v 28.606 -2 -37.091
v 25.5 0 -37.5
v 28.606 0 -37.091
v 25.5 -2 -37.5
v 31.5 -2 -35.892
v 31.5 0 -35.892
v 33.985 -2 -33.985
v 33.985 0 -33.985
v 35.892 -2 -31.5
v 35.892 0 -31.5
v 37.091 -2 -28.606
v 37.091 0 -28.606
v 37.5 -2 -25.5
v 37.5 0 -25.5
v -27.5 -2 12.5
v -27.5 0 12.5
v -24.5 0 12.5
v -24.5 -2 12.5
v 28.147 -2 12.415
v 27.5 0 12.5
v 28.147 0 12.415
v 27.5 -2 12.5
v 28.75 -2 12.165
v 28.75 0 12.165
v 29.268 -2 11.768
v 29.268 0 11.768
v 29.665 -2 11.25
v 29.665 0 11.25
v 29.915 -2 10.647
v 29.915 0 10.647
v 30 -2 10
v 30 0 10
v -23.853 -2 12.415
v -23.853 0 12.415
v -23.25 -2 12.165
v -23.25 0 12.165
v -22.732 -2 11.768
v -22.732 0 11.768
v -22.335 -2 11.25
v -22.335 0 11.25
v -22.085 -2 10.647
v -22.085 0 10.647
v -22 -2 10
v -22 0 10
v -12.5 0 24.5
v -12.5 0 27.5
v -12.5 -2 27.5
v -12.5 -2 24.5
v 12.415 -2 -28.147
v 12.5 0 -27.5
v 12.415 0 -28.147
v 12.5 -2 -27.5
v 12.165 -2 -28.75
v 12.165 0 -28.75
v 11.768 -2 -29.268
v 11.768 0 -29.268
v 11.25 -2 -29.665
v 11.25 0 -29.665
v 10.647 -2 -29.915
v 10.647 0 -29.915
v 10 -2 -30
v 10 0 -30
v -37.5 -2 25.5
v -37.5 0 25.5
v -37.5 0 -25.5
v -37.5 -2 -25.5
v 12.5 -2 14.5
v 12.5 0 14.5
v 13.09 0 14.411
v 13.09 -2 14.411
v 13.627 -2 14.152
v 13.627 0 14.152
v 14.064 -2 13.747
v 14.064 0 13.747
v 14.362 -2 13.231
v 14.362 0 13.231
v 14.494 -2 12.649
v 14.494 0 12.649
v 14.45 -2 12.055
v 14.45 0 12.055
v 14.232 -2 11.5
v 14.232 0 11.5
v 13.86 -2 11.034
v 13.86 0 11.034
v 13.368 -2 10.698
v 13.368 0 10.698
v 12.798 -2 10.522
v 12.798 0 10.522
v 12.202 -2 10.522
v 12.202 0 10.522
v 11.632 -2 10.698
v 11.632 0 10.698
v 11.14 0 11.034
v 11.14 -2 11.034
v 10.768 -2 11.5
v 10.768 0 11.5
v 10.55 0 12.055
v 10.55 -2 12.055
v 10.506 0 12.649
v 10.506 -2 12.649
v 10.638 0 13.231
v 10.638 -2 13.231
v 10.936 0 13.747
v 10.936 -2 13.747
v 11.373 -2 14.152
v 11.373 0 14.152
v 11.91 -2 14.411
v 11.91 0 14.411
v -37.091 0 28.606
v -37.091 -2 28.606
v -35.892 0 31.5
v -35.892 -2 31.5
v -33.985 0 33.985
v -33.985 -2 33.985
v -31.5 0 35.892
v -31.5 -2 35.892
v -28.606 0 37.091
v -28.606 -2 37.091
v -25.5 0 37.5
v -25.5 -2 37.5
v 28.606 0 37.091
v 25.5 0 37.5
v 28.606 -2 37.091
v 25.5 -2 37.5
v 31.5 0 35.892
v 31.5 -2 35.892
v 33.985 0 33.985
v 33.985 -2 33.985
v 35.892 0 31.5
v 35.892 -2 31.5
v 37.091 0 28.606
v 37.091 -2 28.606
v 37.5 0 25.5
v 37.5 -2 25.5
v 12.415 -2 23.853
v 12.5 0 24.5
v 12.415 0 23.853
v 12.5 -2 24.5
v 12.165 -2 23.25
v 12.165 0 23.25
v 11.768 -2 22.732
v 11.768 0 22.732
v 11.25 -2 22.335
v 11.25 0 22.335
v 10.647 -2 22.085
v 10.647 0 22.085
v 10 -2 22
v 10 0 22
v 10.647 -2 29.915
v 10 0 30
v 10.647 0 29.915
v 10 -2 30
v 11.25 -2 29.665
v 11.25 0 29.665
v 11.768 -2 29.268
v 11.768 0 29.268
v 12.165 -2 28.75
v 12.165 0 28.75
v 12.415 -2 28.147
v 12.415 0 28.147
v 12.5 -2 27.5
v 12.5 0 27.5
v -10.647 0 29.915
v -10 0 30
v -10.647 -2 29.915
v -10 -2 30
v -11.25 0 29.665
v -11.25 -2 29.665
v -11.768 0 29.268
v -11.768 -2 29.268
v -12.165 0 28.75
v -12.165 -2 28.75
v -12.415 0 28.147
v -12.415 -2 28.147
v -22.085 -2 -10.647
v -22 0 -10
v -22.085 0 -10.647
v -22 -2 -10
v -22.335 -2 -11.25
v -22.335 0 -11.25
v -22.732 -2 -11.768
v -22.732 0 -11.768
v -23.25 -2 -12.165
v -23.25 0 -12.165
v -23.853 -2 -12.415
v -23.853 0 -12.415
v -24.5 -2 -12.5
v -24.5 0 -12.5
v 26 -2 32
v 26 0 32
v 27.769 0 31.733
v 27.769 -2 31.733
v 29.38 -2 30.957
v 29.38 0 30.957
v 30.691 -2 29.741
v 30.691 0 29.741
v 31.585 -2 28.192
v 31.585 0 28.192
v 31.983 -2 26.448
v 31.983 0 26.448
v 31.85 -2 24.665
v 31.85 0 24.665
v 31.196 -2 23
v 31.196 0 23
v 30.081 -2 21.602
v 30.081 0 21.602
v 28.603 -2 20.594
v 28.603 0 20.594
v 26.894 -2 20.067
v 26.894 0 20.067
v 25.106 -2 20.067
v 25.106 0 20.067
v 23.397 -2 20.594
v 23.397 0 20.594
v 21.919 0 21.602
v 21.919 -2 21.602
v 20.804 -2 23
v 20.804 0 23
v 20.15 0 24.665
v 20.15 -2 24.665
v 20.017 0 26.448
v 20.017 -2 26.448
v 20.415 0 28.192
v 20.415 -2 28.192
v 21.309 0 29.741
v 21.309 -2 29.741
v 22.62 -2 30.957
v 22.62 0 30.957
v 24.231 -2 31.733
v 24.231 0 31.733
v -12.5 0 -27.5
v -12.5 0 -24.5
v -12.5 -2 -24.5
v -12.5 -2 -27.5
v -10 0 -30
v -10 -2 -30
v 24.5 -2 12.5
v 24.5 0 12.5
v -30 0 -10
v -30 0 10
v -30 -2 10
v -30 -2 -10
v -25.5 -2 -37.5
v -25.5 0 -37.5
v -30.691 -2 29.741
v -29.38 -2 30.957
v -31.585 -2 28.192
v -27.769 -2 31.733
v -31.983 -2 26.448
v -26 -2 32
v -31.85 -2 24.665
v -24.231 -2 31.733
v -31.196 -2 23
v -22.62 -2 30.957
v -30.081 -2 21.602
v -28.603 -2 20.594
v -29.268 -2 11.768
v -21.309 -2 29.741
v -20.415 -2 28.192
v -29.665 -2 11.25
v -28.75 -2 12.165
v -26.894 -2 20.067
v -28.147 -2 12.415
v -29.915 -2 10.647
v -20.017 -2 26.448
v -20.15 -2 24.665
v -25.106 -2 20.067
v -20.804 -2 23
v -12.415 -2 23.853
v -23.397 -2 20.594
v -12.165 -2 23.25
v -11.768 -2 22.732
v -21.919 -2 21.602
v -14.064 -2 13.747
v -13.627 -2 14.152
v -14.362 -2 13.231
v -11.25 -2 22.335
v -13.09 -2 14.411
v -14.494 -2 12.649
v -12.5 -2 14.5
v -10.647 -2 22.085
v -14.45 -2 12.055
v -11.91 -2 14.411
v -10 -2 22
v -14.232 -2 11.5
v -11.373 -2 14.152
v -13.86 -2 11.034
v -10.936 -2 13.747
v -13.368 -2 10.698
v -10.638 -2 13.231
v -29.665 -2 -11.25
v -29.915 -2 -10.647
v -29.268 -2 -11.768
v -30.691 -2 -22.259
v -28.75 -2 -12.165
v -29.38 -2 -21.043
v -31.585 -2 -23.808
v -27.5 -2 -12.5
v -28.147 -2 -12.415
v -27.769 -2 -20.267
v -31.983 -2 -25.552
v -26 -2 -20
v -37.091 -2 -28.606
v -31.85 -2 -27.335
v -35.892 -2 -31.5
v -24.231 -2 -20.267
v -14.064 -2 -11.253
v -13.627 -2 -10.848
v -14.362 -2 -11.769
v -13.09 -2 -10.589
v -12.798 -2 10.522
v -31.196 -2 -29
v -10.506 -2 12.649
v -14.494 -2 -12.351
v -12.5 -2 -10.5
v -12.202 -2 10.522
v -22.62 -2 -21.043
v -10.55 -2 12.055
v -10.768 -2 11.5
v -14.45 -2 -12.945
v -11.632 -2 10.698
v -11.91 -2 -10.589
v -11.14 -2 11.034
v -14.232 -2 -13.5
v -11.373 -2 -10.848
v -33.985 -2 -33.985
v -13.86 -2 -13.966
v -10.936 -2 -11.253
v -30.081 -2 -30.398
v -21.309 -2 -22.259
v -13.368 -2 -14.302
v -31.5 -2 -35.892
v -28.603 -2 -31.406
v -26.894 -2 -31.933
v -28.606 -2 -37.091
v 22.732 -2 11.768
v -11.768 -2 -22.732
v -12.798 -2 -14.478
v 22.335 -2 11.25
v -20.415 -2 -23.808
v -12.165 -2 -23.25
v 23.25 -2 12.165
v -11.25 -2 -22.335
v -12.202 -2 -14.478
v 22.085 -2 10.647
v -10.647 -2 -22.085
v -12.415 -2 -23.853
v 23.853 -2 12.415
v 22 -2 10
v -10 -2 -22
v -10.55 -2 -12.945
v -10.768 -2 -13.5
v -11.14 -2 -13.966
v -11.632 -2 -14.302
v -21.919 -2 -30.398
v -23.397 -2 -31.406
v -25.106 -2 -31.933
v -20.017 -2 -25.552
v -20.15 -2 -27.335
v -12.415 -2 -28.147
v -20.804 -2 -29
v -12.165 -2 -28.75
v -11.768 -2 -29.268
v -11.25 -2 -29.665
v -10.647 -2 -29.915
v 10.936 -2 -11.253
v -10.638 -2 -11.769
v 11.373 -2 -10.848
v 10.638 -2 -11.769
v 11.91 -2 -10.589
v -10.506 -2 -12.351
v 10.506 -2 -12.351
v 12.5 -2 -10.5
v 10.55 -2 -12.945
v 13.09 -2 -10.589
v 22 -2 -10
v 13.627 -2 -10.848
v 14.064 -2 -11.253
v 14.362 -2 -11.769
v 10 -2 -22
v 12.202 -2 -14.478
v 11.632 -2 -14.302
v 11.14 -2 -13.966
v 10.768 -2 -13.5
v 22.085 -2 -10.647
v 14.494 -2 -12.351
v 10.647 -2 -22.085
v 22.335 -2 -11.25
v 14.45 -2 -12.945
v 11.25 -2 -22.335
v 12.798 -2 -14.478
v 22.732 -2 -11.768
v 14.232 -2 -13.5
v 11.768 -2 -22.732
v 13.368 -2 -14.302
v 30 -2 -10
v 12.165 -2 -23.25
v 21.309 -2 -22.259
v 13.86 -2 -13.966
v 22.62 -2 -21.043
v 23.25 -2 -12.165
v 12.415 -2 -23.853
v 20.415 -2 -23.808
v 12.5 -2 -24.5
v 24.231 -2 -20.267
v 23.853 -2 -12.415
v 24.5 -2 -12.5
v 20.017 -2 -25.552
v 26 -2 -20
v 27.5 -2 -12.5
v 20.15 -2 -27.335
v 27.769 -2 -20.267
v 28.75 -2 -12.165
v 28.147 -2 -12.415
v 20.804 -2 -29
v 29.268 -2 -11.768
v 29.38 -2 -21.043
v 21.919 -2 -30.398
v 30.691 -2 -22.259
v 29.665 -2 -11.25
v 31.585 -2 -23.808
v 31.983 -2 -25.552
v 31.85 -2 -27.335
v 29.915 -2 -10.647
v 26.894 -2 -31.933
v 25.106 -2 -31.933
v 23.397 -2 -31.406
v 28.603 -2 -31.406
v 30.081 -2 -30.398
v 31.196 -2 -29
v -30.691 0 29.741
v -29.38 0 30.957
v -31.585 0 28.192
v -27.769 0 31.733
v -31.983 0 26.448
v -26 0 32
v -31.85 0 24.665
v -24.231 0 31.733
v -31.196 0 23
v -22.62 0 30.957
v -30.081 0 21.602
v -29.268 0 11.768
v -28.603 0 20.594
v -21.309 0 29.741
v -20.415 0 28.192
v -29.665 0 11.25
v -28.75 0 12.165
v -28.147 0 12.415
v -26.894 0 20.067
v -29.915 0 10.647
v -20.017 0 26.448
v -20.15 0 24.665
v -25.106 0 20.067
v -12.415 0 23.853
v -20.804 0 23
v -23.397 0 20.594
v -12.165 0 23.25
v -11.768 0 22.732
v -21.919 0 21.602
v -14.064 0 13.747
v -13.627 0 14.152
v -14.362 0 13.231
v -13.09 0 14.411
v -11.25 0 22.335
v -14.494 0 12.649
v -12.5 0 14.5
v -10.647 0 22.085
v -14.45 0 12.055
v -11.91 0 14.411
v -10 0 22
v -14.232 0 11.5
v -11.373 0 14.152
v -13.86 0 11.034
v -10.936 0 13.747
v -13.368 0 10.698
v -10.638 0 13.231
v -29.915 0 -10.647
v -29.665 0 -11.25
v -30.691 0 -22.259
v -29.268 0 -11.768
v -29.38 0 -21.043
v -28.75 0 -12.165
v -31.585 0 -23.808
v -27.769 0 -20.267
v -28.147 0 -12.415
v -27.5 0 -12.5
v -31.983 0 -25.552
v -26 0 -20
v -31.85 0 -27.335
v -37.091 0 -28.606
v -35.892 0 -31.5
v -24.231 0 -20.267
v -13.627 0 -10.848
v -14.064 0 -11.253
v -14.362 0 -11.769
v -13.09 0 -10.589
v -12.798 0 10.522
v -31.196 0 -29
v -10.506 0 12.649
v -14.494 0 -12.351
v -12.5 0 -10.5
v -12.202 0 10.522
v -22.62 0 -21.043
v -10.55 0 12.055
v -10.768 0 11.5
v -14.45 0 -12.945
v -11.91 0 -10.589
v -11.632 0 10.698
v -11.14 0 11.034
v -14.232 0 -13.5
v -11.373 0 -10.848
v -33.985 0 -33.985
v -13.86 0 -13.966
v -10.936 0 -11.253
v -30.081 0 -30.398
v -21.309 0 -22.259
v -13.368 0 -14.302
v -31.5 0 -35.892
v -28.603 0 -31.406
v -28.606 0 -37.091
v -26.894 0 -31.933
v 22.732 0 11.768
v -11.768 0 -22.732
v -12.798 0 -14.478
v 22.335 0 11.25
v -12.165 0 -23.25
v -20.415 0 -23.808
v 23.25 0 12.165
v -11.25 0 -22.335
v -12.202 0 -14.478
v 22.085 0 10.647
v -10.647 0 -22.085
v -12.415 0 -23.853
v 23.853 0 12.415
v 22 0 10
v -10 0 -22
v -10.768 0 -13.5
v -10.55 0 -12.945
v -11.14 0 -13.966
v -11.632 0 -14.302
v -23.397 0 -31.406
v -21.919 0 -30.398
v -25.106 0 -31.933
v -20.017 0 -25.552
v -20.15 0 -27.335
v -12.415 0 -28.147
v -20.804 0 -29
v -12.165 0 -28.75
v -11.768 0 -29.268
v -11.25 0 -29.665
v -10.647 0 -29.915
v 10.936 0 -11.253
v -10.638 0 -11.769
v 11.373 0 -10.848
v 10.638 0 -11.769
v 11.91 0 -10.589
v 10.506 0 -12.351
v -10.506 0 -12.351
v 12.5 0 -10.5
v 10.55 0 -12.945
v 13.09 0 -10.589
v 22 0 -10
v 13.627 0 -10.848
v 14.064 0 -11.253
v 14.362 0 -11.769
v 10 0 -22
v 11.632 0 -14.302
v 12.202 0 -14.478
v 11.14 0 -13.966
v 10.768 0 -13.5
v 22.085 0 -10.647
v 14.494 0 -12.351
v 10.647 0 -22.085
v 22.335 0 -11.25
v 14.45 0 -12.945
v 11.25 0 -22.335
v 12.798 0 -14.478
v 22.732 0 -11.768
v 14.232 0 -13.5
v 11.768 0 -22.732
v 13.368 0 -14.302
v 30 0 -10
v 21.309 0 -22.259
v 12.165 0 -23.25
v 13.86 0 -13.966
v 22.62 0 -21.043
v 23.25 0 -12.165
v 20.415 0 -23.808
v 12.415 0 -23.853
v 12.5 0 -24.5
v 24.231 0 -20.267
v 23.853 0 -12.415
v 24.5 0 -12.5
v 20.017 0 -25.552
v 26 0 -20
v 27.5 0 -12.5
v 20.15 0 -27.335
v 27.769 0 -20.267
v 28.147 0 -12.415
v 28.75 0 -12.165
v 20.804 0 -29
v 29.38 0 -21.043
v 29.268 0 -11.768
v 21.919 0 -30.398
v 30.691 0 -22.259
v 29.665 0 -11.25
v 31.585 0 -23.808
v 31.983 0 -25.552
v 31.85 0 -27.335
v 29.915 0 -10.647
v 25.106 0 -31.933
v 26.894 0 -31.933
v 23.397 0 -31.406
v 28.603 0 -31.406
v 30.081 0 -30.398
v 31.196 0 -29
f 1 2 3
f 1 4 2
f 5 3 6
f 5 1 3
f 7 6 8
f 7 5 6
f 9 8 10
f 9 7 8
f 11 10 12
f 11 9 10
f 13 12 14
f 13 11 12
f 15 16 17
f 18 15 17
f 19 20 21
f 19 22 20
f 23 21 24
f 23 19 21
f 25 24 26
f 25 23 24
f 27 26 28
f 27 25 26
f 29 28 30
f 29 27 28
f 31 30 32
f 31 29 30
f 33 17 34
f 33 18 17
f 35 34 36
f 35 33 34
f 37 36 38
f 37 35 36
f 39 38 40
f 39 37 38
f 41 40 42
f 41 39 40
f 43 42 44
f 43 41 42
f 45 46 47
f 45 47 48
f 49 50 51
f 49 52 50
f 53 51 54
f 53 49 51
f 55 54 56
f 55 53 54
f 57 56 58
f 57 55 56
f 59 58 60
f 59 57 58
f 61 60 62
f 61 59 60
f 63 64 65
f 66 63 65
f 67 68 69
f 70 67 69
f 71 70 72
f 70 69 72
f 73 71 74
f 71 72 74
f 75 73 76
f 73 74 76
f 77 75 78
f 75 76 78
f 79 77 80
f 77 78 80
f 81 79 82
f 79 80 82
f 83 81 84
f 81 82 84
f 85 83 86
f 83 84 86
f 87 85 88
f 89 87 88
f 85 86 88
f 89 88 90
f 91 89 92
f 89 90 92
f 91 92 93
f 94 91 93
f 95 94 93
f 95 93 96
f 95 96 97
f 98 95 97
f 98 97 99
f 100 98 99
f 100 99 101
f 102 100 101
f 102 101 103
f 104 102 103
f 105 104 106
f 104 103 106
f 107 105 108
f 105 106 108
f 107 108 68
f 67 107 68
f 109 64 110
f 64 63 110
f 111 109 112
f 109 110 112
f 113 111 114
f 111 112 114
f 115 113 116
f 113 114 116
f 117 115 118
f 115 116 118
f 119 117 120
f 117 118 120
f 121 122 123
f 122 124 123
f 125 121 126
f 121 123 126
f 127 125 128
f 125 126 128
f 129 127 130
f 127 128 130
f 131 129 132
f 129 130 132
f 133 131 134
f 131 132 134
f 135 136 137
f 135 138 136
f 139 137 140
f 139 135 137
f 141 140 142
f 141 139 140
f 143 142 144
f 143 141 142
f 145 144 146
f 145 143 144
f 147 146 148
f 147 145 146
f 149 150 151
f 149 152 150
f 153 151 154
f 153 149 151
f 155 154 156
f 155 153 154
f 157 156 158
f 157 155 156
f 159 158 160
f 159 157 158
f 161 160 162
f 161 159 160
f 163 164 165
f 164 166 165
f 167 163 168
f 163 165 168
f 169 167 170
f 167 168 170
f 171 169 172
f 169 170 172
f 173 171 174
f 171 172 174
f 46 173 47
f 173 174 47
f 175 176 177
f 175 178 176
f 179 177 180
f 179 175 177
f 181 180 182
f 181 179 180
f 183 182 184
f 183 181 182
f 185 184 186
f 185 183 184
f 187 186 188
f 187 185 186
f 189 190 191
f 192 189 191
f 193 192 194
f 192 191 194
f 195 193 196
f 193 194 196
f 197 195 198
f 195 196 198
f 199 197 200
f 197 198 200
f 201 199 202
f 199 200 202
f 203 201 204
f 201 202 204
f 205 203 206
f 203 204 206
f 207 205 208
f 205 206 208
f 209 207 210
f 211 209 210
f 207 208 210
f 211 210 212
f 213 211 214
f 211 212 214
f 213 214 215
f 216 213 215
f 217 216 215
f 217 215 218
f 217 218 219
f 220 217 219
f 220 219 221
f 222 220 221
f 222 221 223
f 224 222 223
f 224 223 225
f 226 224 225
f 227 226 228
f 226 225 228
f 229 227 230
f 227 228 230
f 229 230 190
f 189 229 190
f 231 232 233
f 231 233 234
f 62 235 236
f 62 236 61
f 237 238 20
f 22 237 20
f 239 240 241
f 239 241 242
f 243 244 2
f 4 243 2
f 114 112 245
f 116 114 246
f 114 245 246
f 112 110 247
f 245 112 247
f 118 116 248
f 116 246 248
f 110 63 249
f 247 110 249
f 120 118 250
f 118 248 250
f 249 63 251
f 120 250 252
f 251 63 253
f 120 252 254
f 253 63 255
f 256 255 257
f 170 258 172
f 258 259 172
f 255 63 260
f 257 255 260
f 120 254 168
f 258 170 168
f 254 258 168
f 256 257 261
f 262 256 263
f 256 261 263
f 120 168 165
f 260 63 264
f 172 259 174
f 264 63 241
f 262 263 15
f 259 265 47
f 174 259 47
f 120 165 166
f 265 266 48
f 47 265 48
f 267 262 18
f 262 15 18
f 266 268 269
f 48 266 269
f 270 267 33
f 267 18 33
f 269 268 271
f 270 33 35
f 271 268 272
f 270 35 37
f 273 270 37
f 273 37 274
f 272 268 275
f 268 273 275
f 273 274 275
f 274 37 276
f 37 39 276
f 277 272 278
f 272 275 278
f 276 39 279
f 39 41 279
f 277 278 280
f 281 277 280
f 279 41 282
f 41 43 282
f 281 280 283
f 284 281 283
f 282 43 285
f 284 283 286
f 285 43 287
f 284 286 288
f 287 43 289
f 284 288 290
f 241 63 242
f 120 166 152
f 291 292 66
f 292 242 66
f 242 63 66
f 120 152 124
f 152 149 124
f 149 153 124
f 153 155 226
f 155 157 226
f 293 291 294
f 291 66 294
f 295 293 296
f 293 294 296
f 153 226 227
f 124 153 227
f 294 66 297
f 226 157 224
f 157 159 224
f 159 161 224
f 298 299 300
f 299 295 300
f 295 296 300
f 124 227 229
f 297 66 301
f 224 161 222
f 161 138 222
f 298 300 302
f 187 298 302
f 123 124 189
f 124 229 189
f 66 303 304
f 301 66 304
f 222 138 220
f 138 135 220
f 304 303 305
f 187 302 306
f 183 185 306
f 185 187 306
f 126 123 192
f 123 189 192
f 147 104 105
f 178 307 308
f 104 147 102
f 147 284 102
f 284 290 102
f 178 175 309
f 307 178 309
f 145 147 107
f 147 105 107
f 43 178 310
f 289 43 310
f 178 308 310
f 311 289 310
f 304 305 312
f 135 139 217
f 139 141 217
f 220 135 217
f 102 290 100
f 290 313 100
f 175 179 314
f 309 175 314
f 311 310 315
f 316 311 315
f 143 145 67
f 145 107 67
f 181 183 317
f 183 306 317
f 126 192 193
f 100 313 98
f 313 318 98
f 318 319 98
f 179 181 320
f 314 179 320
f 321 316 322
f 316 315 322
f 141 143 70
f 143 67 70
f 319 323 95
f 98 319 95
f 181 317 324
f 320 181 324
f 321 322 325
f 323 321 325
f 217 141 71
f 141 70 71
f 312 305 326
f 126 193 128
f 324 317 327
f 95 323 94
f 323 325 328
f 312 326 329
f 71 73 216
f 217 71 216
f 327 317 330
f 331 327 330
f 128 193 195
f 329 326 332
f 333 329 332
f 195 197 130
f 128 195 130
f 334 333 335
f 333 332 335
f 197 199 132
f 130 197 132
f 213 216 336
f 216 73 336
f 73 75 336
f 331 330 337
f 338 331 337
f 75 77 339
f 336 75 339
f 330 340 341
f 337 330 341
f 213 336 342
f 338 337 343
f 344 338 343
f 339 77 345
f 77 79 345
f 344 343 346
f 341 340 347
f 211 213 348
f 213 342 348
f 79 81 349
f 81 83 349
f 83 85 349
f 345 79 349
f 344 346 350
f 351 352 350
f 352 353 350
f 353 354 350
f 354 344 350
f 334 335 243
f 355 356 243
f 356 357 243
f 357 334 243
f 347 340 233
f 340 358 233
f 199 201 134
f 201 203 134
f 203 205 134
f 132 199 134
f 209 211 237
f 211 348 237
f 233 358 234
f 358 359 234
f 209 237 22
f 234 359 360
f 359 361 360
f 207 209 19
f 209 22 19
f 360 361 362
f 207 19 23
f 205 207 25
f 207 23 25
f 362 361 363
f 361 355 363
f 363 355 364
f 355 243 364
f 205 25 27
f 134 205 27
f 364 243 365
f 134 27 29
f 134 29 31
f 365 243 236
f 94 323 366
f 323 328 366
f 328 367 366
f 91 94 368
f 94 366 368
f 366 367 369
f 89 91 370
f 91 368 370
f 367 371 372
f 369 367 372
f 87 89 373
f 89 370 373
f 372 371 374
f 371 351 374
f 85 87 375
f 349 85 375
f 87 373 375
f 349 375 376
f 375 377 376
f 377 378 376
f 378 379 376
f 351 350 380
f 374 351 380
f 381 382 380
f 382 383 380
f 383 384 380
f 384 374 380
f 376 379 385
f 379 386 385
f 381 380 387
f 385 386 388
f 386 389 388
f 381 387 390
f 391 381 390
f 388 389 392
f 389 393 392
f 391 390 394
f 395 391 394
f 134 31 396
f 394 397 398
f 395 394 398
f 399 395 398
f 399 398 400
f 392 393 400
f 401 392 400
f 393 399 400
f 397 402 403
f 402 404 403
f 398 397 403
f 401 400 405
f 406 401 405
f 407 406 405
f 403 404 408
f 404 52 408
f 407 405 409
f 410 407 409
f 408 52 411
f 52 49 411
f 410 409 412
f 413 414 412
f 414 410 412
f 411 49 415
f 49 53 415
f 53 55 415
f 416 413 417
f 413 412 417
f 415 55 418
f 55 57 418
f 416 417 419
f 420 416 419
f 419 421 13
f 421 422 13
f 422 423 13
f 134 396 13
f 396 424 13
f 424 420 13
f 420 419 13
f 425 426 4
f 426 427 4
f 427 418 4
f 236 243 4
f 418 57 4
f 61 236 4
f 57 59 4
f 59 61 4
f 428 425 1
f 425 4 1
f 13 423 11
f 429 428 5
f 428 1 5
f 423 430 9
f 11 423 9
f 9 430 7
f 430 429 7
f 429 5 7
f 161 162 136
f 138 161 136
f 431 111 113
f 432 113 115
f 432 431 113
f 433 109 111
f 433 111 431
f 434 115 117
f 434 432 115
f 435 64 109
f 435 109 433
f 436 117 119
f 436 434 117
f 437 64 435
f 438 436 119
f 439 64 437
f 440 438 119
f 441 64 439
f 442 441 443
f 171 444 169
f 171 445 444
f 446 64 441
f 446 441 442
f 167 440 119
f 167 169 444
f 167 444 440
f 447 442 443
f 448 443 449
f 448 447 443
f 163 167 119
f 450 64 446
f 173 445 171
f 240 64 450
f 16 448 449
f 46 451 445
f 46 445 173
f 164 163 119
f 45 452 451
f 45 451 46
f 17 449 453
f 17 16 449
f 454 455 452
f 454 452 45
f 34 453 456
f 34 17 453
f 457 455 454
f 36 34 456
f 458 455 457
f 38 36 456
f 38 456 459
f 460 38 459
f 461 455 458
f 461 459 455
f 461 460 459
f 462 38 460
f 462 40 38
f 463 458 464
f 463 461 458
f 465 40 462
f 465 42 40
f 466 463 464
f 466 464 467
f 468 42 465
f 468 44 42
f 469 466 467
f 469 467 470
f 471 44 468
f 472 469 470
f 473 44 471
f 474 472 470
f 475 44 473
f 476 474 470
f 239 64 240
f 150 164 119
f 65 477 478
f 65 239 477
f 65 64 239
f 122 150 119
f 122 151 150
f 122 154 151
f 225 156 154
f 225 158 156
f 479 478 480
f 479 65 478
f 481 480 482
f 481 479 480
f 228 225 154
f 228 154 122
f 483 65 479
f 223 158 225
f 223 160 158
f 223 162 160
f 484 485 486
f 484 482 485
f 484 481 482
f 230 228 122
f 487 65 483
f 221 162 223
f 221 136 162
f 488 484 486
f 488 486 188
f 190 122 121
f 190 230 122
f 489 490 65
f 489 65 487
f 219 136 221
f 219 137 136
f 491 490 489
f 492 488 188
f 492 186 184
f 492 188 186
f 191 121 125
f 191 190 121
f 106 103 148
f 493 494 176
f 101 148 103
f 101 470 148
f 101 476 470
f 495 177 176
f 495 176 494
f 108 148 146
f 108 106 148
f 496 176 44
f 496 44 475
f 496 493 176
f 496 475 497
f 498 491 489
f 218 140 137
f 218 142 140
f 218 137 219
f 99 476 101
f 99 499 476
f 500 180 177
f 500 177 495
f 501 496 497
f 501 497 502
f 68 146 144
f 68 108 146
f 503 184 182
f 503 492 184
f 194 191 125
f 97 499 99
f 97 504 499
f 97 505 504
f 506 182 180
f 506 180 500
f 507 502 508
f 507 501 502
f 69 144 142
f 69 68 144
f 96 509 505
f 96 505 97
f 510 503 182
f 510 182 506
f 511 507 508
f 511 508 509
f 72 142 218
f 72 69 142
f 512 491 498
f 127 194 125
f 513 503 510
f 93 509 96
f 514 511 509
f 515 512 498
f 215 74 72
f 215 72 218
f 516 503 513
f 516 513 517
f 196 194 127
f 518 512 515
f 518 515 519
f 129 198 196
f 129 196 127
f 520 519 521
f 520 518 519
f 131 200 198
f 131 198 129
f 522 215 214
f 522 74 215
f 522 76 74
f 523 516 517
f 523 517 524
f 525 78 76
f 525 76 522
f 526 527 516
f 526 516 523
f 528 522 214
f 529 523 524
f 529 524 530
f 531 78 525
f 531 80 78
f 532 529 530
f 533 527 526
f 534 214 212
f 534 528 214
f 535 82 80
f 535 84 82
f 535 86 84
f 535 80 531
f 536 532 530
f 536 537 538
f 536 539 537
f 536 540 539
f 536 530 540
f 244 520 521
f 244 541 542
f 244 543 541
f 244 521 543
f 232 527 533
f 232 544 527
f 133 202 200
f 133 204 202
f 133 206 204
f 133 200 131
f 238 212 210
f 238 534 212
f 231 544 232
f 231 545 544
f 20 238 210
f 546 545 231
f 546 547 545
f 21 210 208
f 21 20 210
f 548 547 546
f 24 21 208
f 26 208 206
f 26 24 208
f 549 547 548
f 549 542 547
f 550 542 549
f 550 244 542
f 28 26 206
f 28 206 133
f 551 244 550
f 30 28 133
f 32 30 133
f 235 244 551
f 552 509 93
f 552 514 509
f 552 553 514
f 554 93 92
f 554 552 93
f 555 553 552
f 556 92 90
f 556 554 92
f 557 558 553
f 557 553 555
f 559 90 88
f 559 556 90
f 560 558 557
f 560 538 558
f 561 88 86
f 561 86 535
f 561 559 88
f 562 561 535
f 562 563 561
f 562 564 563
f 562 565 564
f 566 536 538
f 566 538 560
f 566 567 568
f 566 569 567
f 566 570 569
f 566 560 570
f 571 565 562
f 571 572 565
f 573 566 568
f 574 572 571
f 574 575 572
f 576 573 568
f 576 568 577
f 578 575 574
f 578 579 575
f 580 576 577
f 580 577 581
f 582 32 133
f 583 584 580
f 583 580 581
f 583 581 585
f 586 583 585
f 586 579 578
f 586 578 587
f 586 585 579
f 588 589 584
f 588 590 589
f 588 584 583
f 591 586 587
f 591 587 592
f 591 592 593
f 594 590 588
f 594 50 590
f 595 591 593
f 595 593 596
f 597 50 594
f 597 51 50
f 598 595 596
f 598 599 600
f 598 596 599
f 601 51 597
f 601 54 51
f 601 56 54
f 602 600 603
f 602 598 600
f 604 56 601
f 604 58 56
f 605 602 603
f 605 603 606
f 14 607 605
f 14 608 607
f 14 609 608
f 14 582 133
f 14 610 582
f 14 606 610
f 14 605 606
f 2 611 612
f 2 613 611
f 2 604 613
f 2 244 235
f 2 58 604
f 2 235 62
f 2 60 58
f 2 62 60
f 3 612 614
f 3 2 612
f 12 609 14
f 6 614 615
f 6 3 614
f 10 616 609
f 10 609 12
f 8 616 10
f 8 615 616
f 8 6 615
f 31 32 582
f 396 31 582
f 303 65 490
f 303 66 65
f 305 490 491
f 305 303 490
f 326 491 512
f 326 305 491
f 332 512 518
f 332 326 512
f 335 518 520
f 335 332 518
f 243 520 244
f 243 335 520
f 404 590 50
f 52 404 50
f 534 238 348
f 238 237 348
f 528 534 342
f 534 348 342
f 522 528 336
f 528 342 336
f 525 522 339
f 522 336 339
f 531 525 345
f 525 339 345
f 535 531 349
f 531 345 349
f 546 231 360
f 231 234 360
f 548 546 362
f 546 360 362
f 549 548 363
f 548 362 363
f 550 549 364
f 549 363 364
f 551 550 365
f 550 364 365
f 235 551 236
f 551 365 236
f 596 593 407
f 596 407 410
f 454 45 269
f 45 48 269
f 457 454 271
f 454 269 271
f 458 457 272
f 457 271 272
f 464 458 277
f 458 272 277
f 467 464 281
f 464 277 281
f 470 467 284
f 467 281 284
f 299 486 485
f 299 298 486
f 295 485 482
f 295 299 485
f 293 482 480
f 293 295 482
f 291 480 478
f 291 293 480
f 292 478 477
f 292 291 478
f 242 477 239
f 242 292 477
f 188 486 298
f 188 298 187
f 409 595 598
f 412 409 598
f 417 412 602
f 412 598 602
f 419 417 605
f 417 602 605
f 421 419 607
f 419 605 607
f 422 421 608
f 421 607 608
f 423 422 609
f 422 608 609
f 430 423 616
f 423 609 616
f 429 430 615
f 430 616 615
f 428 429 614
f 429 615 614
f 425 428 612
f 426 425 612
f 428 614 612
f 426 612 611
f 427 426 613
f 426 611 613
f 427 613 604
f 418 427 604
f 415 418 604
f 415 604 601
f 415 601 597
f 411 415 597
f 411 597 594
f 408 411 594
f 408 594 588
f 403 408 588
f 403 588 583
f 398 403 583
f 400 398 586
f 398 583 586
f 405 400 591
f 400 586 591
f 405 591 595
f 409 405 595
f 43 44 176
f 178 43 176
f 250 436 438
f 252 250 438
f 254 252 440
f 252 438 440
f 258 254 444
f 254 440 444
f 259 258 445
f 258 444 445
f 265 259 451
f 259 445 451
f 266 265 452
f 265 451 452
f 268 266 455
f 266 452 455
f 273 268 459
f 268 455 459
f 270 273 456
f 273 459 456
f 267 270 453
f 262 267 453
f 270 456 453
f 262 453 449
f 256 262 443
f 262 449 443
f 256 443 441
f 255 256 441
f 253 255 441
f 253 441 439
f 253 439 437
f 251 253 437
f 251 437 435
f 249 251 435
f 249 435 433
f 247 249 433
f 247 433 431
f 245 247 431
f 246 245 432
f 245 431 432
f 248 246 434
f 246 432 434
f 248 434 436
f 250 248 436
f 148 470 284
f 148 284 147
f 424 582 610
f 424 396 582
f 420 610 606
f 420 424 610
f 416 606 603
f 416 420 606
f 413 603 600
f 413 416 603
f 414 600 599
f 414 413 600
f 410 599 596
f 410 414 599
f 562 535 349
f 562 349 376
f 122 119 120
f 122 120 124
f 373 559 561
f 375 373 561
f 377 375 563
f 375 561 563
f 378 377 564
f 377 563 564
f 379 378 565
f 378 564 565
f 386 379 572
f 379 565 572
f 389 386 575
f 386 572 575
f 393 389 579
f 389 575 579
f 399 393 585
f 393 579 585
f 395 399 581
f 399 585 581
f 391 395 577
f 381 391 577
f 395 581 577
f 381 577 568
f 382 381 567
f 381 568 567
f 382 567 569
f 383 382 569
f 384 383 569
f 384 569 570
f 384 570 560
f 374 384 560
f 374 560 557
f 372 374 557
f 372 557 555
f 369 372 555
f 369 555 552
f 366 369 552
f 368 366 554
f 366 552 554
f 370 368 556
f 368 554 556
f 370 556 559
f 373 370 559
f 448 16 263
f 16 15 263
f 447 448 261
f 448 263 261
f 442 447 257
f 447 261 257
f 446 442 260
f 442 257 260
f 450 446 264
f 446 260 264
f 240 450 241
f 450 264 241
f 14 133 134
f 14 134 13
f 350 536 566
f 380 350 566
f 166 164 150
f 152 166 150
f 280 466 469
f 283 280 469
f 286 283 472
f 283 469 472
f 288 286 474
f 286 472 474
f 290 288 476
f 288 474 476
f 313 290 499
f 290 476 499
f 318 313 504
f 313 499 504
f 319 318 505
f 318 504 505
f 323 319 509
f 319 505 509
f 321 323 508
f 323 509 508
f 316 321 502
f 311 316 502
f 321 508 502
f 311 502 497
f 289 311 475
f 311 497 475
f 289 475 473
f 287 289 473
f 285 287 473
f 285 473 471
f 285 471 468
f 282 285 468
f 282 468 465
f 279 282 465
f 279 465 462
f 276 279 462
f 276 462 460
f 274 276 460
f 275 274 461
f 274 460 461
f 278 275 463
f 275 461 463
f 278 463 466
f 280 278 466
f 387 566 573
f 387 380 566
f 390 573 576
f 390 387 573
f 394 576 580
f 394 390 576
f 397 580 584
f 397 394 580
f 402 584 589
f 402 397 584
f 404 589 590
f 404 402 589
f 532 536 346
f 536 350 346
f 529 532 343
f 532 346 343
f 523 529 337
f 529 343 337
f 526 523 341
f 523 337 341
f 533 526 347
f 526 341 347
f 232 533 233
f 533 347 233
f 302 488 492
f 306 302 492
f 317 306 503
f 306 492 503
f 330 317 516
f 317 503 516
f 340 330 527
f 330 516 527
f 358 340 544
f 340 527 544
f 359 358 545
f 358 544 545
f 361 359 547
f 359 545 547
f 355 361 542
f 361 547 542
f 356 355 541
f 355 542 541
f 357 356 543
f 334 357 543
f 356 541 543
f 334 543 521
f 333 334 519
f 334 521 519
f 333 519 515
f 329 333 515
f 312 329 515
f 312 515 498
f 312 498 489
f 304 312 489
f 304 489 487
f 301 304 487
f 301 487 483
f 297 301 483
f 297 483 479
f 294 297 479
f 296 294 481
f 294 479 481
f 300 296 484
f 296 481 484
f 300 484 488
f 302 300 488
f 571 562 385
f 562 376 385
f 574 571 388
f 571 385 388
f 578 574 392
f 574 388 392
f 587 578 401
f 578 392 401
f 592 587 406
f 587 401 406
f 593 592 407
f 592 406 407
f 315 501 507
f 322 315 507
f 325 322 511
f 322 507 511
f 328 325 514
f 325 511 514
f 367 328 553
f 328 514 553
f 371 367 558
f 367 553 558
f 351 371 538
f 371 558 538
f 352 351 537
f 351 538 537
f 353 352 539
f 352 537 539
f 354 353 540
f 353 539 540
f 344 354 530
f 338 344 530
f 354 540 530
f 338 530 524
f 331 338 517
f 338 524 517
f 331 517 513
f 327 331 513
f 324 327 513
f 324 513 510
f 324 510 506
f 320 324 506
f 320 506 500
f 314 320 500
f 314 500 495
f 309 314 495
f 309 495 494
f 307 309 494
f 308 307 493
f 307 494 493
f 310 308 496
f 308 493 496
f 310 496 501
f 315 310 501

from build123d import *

# Parameters (mm, degrees)
SKETCH_1_W             = 75
SKETCH_1_H             = 75
SKETCH_1_R             = 6
SKETCH_1_R_2           = 2
SKETCH_1_W_2           = 8
SKETCH_1_H_2           = 25
SKETCH_1_W_3           = 25
SKETCH_1_H_3           = 8
SM_BASE_FLANGE_1_DEPTH = 2
FILLET_1_R             = 12
FILLET_2_R             = 2.5


# Sheet-metal steps are written as plain solids
with BuildPart() as part:
    # Sketch 1 → 基体-法兰1 (new body)
    with BuildSketch(Plane(origin=(0, 0, 0), x_dir=(1, 0, 0), z_dir=(0, 1, 0))):
        Rectangle(SKETCH_1_W, SKETCH_1_H)
        with Locations(Location((26, 26, 0), (0, 0, 270))):
            Circle(SKETCH_1_R, mode=Mode.SUBTRACT)
        with Locations(Location((26, -26, 0), (0, 0, 270))):
            Circle(SKETCH_1_R, mode=Mode.SUBTRACT)
        with Locations(Location((-26, -26, 0), (0, 0, 270))):
            Circle(SKETCH_1_R, mode=Mode.SUBTRACT)
        with Locations(Location((-26, 26, 0), (0, 0, 270))):
            Circle(SKETCH_1_R, mode=Mode.SUBTRACT)
        with Locations(Location((-12.5, 12.5, 0), (0, 0, 270))):
            Circle(SKETCH_1_R_2, mode=Mode.SUBTRACT)
        with Locations(Location((12.5, 12.5, 0), (0, 0, 270))):
            Circle(SKETCH_1_R_2, mode=Mode.SUBTRACT)
        with Locations(Location((12.5, -12.5, 0), (0, 0, 270))):
            Circle(SKETCH_1_R_2, mode=Mode.SUBTRACT)
        with Locations(Location((-12.5, -12.5, 0), (0, 0, 270))):
            Circle(SKETCH_1_R_2, mode=Mode.SUBTRACT)
        with Locations((26, 0)):
            Rectangle(SKETCH_1_W_2, SKETCH_1_H_2, mode=Mode.SUBTRACT)
        with Locations((0, 26)):
            Rectangle(SKETCH_1_W_3, SKETCH_1_H_3, mode=Mode.SUBTRACT)
        with Locations((0, -26)):
            Rectangle(SKETCH_1_W_3, SKETCH_1_H_3, mode=Mode.SUBTRACT)
        with Locations((-26, 0)):
            Rectangle(SKETCH_1_W_2, SKETCH_1_H_2, mode=Mode.SUBTRACT)
    extrude(amount=-SM_BASE_FLANGE_1_DEPTH)

    # 圆角1
    fillet_1_edges = [part.edges().sort_by_distance(p)[0] for p in [
        (-37.5, -1, -37.5),
        (37.5, -1, -37.5),
        (37.5, -1, 37.5),
        (-37.5, -1, 37.5),
    ]]
    fillet(fillet_1_edges, radius=FILLET_1_R)

    # 圆角2
    fillet_2_edges = [part.edges().sort_by_distance(p)[0] for p in [
        (-12.5, -1, -22),
        (-12.5, -1, -30),
        (12.5, -1, -30),
        (12.5, -1, -22),
        (30, -1, -12.5),
        (30, -1, 12.5),
        (22, -1, 12.5),
        (22, -1, -12.5),
        (12.5, -1, 30),
        (-12.5, -1, 30),
        (-12.5, -1, 22),
        (12.5, -1, 22),
        (-30, -1, 12.5),
        (-30, -1, -12.5),
        (-22, -1, -12.5),
        (-22, -1, 12.5),
    ]]
    fillet(fillet_2_edges, radius=FILLET_2_R)


solid = part.part
